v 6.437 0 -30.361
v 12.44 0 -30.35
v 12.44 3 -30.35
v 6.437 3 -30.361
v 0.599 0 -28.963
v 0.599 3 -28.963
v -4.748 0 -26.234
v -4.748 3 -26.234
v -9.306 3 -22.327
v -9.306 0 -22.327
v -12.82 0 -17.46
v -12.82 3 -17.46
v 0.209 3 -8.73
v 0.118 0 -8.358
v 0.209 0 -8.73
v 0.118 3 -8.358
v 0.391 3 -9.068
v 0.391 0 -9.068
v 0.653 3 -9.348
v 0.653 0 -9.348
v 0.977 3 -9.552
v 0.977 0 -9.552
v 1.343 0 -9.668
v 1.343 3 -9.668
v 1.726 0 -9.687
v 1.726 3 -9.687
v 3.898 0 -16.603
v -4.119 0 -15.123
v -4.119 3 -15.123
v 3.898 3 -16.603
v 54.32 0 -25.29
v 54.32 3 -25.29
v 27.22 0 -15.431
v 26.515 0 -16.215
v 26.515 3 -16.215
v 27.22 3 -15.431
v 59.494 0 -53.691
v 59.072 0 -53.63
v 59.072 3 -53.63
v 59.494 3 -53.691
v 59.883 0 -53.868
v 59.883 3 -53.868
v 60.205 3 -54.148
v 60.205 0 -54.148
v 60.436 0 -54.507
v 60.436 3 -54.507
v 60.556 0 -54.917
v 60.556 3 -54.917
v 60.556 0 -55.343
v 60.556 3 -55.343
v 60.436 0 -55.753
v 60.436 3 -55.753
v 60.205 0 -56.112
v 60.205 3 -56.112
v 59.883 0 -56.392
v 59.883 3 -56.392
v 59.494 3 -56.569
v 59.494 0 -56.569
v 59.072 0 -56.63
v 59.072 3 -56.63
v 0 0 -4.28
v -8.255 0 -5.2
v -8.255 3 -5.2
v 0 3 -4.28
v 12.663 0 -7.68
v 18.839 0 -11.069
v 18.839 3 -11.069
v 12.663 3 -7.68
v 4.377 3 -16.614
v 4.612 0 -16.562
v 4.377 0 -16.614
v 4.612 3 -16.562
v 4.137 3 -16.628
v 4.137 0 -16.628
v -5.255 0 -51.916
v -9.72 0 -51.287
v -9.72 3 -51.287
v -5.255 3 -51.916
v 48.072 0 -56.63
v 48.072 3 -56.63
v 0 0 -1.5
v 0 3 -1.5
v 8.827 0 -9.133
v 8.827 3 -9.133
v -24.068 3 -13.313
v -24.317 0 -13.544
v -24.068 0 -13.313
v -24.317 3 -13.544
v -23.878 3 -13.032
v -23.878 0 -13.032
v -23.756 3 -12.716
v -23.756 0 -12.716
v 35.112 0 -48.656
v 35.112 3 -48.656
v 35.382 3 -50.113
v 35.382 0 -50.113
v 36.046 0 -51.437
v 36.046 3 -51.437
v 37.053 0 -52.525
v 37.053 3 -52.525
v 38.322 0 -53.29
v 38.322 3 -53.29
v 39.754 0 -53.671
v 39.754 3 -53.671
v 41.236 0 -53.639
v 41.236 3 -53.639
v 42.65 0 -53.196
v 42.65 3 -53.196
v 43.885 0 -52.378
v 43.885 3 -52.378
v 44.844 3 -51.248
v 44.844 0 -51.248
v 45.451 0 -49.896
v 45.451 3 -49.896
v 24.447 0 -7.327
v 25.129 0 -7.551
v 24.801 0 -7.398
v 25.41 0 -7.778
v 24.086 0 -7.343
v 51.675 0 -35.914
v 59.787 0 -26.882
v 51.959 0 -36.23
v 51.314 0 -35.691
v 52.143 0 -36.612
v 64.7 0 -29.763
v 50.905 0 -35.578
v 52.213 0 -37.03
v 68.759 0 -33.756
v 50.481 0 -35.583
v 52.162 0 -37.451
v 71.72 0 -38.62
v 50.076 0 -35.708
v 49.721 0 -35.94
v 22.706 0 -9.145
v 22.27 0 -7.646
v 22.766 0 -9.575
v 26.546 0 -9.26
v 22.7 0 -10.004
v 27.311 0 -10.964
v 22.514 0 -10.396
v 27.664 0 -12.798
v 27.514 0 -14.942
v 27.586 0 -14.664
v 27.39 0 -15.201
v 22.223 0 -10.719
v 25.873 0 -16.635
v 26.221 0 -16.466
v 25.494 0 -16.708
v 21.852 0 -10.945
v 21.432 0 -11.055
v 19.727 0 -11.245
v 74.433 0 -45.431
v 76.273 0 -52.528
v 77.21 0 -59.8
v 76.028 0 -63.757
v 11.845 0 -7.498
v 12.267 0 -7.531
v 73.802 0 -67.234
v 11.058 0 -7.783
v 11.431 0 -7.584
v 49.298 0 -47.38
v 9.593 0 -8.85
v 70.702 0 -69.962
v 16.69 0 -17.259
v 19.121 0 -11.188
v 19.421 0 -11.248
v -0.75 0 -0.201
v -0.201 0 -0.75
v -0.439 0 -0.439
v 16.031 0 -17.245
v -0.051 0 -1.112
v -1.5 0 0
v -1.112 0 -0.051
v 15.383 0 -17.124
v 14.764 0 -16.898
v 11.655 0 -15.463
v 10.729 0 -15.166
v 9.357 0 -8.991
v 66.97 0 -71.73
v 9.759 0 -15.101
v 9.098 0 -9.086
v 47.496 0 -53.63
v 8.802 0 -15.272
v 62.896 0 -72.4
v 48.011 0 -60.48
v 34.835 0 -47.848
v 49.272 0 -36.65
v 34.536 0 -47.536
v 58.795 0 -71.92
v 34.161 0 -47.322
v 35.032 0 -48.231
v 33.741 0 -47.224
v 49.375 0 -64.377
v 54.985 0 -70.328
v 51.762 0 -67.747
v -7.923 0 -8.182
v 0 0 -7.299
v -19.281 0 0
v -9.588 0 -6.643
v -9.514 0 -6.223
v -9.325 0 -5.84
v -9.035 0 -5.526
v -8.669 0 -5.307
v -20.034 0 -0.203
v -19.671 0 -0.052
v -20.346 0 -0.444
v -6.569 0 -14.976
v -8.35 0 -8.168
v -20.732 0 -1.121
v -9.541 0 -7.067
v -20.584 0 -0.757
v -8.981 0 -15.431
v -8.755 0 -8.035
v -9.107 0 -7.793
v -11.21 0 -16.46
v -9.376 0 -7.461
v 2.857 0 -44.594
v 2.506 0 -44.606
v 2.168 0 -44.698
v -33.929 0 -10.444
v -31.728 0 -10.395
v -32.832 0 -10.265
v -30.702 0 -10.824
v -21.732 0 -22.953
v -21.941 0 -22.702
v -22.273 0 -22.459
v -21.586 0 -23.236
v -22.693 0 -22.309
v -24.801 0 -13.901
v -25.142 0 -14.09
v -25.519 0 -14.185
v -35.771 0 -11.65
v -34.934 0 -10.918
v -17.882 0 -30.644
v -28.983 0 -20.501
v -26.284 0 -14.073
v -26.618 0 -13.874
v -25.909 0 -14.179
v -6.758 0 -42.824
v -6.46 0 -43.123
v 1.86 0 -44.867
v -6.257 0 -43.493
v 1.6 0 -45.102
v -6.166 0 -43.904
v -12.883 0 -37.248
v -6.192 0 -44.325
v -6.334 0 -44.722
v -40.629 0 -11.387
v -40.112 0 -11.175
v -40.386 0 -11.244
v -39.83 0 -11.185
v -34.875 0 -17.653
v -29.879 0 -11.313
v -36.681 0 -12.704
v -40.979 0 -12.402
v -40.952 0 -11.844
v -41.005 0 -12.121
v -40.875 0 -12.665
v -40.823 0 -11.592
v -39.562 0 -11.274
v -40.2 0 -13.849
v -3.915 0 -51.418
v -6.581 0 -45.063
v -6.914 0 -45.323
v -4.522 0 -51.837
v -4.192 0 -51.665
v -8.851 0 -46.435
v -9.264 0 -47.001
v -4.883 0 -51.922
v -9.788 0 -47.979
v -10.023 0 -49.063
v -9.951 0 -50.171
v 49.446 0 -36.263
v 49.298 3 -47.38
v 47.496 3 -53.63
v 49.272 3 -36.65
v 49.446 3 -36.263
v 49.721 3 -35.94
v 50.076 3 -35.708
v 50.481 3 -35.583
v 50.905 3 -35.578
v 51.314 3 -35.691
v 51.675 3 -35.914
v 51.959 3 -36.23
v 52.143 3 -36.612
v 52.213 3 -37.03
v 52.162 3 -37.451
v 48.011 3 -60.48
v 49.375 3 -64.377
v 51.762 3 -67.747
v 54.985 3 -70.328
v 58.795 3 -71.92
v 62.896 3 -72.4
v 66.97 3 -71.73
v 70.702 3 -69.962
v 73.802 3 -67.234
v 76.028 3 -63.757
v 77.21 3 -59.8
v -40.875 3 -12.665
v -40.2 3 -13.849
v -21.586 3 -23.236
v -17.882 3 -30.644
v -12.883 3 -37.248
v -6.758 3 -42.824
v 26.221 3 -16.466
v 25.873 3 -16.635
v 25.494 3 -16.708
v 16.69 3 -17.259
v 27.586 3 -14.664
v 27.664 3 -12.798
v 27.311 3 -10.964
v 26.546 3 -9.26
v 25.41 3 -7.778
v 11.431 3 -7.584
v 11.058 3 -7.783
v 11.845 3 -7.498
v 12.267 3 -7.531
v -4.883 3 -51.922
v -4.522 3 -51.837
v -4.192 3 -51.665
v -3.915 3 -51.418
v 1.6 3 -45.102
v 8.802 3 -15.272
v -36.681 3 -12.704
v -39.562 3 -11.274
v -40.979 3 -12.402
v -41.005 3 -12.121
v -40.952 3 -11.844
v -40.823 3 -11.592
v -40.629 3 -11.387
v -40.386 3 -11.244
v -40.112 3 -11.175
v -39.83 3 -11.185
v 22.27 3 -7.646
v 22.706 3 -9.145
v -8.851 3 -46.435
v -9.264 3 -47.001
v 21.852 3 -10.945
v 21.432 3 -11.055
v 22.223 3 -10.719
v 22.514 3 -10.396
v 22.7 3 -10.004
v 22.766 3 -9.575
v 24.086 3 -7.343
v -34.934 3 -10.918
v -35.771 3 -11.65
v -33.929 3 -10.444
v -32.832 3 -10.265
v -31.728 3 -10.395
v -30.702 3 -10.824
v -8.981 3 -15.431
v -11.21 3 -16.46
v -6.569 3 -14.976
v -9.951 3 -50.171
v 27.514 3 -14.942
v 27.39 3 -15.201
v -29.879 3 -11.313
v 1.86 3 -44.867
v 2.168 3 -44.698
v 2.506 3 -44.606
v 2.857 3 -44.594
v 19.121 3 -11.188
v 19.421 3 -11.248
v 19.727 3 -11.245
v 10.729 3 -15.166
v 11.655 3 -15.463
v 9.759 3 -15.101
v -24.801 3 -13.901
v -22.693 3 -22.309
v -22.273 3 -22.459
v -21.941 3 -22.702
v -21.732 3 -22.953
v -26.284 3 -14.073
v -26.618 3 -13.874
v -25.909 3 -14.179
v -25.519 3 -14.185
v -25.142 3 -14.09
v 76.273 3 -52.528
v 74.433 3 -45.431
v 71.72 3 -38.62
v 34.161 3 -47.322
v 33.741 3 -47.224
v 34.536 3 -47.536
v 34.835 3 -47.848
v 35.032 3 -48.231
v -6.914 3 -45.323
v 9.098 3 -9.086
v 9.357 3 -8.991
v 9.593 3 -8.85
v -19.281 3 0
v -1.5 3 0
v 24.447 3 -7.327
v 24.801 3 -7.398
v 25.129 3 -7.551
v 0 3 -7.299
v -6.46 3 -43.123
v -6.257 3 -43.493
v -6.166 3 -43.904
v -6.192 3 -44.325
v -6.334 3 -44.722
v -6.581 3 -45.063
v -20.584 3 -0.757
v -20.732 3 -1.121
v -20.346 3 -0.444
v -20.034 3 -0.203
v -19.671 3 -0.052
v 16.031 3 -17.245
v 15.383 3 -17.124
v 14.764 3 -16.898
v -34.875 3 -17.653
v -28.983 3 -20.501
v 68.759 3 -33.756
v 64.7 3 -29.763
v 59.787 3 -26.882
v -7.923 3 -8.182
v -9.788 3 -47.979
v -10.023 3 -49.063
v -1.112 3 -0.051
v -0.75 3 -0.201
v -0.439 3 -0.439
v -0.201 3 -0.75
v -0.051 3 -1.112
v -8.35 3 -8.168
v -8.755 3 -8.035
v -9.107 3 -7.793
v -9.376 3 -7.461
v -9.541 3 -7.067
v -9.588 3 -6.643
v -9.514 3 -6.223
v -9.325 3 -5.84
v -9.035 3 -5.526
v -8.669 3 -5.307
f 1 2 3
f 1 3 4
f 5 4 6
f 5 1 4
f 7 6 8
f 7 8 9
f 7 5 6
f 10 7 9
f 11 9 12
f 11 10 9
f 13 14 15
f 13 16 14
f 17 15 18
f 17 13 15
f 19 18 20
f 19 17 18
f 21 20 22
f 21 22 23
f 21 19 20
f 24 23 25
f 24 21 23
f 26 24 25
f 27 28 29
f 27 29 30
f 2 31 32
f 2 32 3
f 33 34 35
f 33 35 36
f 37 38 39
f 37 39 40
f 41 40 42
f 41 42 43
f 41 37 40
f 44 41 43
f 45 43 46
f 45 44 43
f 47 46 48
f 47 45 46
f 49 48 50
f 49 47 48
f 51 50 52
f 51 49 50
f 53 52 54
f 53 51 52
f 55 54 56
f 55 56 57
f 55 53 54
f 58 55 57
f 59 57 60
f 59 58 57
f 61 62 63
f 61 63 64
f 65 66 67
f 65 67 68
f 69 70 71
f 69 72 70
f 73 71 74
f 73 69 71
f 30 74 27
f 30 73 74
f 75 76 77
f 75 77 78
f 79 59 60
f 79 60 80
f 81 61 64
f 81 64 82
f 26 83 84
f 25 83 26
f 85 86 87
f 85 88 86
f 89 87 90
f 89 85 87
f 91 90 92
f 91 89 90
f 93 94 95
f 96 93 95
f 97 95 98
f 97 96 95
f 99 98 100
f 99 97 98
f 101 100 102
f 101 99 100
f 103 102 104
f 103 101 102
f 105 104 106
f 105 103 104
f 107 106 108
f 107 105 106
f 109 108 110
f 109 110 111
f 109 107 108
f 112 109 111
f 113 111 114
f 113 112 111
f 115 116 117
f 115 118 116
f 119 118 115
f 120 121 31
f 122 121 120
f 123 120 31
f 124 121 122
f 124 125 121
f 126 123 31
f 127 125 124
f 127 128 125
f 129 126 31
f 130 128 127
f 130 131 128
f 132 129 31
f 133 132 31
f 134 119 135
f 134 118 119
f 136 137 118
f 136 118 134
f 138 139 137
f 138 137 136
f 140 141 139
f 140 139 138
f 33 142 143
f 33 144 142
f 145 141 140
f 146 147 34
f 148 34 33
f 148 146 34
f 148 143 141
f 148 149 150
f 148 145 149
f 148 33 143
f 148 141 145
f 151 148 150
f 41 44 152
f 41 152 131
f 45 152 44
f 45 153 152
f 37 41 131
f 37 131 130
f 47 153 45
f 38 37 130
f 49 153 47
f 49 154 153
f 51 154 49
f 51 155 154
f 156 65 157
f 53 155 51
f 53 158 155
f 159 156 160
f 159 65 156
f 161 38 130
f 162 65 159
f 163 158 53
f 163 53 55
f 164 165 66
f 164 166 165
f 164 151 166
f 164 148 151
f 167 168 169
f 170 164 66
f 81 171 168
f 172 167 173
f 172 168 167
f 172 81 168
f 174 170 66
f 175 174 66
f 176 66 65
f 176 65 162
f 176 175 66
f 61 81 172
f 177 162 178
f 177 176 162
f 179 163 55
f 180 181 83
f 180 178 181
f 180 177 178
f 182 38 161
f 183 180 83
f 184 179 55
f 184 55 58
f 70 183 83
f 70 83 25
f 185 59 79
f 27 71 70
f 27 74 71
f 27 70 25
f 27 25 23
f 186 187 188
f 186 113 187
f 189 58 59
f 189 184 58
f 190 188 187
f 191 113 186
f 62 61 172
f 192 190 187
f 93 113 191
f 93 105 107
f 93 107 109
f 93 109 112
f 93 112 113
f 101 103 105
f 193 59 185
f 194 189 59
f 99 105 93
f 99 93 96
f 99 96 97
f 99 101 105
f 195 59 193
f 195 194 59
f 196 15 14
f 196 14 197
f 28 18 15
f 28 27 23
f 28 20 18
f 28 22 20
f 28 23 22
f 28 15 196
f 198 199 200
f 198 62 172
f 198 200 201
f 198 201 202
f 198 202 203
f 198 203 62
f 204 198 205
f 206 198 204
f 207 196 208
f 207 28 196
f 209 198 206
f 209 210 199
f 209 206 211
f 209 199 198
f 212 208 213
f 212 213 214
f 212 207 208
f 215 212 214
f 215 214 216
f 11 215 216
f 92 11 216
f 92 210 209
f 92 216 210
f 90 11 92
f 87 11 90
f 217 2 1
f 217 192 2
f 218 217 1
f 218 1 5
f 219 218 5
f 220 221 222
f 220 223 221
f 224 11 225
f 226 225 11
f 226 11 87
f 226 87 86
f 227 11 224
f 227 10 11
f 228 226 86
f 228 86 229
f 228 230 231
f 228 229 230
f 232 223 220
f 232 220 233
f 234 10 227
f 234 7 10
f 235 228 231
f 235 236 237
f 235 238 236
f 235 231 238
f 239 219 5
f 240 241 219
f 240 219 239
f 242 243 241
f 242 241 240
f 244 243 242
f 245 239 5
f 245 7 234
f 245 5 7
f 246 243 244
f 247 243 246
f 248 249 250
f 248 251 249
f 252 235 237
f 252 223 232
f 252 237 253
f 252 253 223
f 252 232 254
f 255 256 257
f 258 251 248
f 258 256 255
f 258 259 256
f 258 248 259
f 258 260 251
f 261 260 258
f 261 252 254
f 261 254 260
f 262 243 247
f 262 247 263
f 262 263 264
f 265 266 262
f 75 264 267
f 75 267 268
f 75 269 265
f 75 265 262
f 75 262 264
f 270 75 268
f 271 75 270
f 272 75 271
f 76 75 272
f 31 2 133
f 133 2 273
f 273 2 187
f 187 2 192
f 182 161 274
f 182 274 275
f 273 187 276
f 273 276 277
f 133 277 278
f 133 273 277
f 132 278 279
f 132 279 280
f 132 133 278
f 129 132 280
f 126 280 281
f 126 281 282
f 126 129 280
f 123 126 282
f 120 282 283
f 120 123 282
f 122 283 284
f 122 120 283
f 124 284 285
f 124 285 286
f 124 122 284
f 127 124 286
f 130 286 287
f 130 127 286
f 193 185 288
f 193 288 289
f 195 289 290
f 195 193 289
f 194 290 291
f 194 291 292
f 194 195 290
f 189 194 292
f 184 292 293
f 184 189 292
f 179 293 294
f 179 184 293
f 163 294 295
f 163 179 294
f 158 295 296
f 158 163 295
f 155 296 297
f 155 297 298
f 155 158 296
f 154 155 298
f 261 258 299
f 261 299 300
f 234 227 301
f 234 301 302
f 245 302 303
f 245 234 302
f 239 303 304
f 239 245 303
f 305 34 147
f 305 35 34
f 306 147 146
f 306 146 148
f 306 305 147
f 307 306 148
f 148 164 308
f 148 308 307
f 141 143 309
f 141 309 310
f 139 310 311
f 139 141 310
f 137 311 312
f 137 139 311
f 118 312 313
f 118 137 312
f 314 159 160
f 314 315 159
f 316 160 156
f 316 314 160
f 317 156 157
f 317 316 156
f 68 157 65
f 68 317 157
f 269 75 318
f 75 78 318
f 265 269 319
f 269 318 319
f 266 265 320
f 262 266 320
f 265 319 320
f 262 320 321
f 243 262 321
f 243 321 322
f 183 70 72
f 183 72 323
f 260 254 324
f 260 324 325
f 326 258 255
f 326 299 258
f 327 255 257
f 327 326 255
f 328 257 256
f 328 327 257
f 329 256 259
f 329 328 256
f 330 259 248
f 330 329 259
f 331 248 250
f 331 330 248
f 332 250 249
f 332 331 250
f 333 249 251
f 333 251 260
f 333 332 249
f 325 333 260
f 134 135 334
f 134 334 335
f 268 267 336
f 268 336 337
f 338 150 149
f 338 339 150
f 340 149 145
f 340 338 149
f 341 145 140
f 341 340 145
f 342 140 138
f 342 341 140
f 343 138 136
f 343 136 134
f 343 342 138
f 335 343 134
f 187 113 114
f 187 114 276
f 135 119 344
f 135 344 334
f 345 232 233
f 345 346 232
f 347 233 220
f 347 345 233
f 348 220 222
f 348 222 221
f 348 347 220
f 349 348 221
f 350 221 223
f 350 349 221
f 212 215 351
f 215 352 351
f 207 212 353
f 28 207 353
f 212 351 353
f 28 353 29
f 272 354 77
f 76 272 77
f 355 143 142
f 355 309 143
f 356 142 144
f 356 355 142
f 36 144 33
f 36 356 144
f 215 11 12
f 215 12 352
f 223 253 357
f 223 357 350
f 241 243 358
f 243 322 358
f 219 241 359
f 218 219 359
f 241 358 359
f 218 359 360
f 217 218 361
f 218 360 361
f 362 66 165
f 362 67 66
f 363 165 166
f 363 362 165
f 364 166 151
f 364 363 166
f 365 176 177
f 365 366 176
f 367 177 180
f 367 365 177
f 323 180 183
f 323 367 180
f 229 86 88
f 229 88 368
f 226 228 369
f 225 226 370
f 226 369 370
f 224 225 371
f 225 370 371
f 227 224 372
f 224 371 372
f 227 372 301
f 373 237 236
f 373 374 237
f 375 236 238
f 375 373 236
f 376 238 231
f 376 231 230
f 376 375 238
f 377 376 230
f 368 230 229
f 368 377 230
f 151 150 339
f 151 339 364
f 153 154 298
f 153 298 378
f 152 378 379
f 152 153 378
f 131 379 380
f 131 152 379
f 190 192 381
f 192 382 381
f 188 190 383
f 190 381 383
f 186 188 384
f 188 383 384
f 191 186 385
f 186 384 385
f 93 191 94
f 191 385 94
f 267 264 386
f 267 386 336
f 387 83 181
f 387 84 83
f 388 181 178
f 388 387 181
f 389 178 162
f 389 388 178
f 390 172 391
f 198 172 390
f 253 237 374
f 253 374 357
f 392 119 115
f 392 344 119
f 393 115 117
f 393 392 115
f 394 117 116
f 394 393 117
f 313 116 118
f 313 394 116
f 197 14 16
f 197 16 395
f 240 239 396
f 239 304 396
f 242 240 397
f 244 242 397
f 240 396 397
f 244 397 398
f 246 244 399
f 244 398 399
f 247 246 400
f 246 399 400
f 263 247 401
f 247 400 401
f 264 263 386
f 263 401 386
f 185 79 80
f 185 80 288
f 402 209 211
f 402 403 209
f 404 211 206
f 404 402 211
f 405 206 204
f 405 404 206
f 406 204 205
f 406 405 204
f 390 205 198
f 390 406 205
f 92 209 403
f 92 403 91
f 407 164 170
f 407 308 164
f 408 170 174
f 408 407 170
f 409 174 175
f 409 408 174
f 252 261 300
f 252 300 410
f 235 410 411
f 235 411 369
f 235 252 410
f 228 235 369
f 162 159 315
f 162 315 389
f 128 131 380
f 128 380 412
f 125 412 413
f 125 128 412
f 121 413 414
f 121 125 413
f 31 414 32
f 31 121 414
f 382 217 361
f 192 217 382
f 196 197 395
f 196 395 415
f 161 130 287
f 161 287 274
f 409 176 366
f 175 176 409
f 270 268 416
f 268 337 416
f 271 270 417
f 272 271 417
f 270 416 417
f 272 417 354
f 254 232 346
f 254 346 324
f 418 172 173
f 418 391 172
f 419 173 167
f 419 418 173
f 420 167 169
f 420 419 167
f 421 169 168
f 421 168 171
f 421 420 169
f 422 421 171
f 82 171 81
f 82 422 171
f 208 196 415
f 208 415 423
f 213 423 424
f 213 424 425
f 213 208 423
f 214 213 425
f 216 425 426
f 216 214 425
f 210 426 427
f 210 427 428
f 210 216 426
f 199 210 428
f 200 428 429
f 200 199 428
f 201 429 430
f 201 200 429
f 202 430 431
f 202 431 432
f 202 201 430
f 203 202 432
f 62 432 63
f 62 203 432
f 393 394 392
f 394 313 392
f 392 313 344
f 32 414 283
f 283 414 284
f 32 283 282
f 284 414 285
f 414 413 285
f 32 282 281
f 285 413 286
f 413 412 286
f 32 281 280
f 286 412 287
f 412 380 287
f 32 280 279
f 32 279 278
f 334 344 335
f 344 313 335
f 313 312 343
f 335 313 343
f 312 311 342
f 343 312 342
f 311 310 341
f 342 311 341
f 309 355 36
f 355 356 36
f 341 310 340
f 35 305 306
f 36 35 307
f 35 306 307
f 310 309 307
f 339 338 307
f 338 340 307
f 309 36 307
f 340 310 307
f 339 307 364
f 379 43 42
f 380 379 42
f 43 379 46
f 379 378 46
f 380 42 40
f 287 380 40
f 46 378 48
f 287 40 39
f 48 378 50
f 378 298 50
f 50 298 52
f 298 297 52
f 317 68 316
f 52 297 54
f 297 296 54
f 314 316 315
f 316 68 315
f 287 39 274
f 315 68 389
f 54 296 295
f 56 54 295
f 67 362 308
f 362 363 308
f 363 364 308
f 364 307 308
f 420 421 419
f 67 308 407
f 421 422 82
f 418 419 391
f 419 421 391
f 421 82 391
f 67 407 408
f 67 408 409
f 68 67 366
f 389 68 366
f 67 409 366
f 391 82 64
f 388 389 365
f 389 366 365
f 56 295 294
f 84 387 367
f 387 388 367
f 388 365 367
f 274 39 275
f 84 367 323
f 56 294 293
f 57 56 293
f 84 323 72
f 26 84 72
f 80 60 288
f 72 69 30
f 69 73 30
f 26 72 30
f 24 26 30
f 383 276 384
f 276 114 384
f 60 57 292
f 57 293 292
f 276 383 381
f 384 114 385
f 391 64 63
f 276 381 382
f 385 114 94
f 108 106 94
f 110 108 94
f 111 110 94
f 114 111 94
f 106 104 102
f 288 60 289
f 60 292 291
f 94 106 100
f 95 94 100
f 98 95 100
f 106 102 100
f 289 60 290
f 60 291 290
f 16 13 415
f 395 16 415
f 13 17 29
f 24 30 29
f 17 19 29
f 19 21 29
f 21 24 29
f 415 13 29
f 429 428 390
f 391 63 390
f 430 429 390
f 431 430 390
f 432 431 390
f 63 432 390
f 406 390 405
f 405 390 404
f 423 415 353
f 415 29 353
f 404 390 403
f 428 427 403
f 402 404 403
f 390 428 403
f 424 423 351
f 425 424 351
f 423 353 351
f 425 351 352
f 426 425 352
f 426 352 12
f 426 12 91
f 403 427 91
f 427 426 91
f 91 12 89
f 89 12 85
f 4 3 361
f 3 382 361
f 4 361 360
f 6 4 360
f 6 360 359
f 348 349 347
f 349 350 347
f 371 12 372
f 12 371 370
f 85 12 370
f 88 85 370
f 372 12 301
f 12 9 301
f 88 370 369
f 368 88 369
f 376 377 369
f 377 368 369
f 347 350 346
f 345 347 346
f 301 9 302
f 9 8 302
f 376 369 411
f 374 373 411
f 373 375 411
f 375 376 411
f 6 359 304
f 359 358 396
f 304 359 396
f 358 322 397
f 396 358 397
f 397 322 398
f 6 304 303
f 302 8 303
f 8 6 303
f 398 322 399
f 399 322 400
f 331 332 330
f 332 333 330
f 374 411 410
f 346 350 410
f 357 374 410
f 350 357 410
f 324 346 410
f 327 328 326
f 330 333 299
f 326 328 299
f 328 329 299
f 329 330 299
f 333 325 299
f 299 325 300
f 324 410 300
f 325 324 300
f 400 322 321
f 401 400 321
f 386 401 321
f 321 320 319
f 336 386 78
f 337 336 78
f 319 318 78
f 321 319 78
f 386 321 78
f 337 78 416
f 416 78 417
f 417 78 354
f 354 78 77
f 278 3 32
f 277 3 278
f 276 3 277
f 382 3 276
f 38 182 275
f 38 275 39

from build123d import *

# Parameters (mm, degrees)
BOSS_EXTRUDE1_DEPTH = 3
FILLET1_R           = 10
FILLET2_R           = 1
FILLET3_R           = 1.5
FILLET4_R           = 4
FILLET5_R           = 4


with BuildPart() as part:
    # Sketch2 → Boss-Extrude1 (new body)
    with BuildSketch(Plane(origin=(0, 0, 0), x_dir=(1, 0, 0), z_dir=(0, 1, 0))):
        with BuildLine():
            Line((-42.5, 9.815250458), (-40.2, 13.848552856))
            ThreePointArc((-40.2, 13.848552856), (-31.616402931, 19.380516515), (-21.88, 22.46))
            ThreePointArc((-21.88, 22.46), (-15.087159026, 34.642704233), (-4.89, 44.16))
            Line((-4.89, 44.16), (-8.851038754, 46.435359195))
            Line((-8.851038754, 46.435359195), (-10.31, 48.433697347))
            Line((-10.31, 48.433697347), (-9.719569356, 51.28656851))
            Line((-9.719569356, 51.28656851), (-4.45, 52.03))
            Line((-4.45, 52.03), (2.1, 44.53))
            Line((2.1, 44.53), (35.22, 47.35))
            ThreePointArc((35.22, 47.35), (39.1087714, 53.552611798), (45.450837647, 49.895682508))
            Line((45.450837647, 49.895682508), (49.271682555, 36.649721013))
            ThreePointArc((49.271682555, 36.649721013), (51.113757972, 35.62), (52.162431436, 37.451352279))
            Line((52.162431436, 37.451352279), (49.298477535, 47.38))
            Line((49.298477535, 47.38), (47.49564271, 53.63))
            Line((47.49564271, 53.63), (59.07164271, 53.63))
            ThreePointArc((59.07164271, 53.63), (60.57164271, 55.13), (59.07164271, 56.63))
            Line((59.07164271, 56.63), (48.07164271, 56.63))
            Line((48.07164271, 56.63), (48.010812194, 60.48))
            ThreePointArc((48.010812194, 60.48), (62.895920888, 72.4), (77.21, 59.8))
            ThreePointArc((77.21, 59.8), (75.464062366, 48.951036242), (71.72, 38.62))
            ThreePointArc((71.72, 38.62), (64.699564013, 29.762620869), (54.32, 25.29))
            Line((54.32, 25.29), (12.44, 30.35))
            ThreePointArc((12.44, 30.35), (-2.155765073, 27.757228529), (-12.82, 17.46))
            Line((-12.82, 17.46), (-7.923093172, 14.42))
            Line((-7.923093172, 14.42), (4.26, 16.67))
            Line((4.26, 16.67), (10.264967392, 14.82186735))
            Line((10.264967392, 14.82186735), (15.68118928, 17.321714129))
            Line((15.68118928, 17.321714129), (26.105067381, 16.67))
            Line((26.105067381, 16.67), (27.5, 15.12))
            ThreePointArc((27.5, 15.12), (27.256062178, 10.796585791), (24.812537217, 7.22158903))
            Line((24.812537217, 7.22158903), (22.269740859, 7.646334739))
            Line((22.269740859, 7.646334739), (23.205269456, 10.857431213))
            Line((23.205269456, 10.857431213), (19.255161489, 11.297641869))
            Line((19.255161489, 11.297641869), (11.827625236, 7.22158903))
            Line((11.827625236, 7.22158903), (9.25, 9.1))
            Line((9.25, 9.1), (0.278765895, 9.8))
            Line((0.278765895, 9.8), (0, 7.298571725))
            Line((0, 7.298571725), (-7.923093172, 8.181542538))
            ThreePointArc((-7.923093172, 8.181542538), (-9.58, 6.856906829), (-8.255364291, 5.2))
            Line((-8.255364291, 5.2), (0, 4.28))
            Line((0, 4.28), (0, 0))
            Line((0, 0), (-20.44, 0))
            Line((-20.44, 0), (-23.89, 13.229016126))
            Line((-23.89, 13.229016126), (-25.72, 14.58))
            Line((-25.72, 14.58), (-29.87882635, 11.312892327))
            Line((-29.87882635, 11.312892327), (-33.582044966, 9.115250458))
            Line((-33.582044966, 9.115250458), (-36.680656461, 12.703691255))
            Line((-36.680656461, 12.703691255), (-42.5, 9.815250458))
        make_face()
    extrude(amount=BOSS_EXTRUDE1_DEPTH)

    # Fillet1
    fillet1_edges = [part.edges().sort_by_distance(p)[0] for p in [
        (-7.923093172, 1.5, -14.42),
    ]]
    fillet(fillet1_edges, radius=FILLET1_R)

    # Fillet2
    fillet2_edges = [part.edges().sort_by_distance(p)[0] for p in [
        (-42.5, 1.5, -9.815250458),
    ]]
    fillet(fillet2_edges, radius=FILLET2_R)

    # Fillet3
    fillet3_edges = [part.edges().sort_by_distance(p)[0] for p in [
        (4.26, 1.5, -16.67),
        (26.105067381, 1.5, -16.67),
        (27.5, 1.5, -15.12),
        (24.812537217, 1.5, -7.22158903),
        (23.205269456, 1.5, -10.857431213),
        (19.255161489, 1.5, -11.297641869),
        (11.827625236, 1.5, -7.22158903),
        (9.25, 1.5, -9.1),
        (0.278765895, 1.5, -9.8),
        (0, 1.5, 0),
        (-20.44, 1.5, 0),
        (-23.89, 1.5, -13.229016126),
        (-25.72, 1.5, -14.58),
        (-21.88, 1.5, -22.46),
        (-4.89, 1.5, -44.16),
        (-4.45, 1.5, -52.03),
        (2.1, 1.5, -44.53),
        (35.22, 1.5, -47.35),
    ]]
    fillet(fillet3_edges, radius=FILLET3_R)

    # Fillet4
    fillet4_edges = [part.edges().sort_by_distance(p)[0] for p in [
        (-33.582044966, 1.5, -9.115250458),
        (-10.31, 1.5, -48.433697347),
    ]]
    fillet(fillet4_edges, radius=FILLET4_R)

    # Fillet5
    fillet5_edges = [part.edges().sort_by_distance(p)[0] for p in [
        (10.264967392, 1.5, -14.82186735),
        (15.68118928, 1.5, -17.321714129),
    ]]
    fillet(fillet5_edges, radius=FILLET5_R)


solid = part.part
